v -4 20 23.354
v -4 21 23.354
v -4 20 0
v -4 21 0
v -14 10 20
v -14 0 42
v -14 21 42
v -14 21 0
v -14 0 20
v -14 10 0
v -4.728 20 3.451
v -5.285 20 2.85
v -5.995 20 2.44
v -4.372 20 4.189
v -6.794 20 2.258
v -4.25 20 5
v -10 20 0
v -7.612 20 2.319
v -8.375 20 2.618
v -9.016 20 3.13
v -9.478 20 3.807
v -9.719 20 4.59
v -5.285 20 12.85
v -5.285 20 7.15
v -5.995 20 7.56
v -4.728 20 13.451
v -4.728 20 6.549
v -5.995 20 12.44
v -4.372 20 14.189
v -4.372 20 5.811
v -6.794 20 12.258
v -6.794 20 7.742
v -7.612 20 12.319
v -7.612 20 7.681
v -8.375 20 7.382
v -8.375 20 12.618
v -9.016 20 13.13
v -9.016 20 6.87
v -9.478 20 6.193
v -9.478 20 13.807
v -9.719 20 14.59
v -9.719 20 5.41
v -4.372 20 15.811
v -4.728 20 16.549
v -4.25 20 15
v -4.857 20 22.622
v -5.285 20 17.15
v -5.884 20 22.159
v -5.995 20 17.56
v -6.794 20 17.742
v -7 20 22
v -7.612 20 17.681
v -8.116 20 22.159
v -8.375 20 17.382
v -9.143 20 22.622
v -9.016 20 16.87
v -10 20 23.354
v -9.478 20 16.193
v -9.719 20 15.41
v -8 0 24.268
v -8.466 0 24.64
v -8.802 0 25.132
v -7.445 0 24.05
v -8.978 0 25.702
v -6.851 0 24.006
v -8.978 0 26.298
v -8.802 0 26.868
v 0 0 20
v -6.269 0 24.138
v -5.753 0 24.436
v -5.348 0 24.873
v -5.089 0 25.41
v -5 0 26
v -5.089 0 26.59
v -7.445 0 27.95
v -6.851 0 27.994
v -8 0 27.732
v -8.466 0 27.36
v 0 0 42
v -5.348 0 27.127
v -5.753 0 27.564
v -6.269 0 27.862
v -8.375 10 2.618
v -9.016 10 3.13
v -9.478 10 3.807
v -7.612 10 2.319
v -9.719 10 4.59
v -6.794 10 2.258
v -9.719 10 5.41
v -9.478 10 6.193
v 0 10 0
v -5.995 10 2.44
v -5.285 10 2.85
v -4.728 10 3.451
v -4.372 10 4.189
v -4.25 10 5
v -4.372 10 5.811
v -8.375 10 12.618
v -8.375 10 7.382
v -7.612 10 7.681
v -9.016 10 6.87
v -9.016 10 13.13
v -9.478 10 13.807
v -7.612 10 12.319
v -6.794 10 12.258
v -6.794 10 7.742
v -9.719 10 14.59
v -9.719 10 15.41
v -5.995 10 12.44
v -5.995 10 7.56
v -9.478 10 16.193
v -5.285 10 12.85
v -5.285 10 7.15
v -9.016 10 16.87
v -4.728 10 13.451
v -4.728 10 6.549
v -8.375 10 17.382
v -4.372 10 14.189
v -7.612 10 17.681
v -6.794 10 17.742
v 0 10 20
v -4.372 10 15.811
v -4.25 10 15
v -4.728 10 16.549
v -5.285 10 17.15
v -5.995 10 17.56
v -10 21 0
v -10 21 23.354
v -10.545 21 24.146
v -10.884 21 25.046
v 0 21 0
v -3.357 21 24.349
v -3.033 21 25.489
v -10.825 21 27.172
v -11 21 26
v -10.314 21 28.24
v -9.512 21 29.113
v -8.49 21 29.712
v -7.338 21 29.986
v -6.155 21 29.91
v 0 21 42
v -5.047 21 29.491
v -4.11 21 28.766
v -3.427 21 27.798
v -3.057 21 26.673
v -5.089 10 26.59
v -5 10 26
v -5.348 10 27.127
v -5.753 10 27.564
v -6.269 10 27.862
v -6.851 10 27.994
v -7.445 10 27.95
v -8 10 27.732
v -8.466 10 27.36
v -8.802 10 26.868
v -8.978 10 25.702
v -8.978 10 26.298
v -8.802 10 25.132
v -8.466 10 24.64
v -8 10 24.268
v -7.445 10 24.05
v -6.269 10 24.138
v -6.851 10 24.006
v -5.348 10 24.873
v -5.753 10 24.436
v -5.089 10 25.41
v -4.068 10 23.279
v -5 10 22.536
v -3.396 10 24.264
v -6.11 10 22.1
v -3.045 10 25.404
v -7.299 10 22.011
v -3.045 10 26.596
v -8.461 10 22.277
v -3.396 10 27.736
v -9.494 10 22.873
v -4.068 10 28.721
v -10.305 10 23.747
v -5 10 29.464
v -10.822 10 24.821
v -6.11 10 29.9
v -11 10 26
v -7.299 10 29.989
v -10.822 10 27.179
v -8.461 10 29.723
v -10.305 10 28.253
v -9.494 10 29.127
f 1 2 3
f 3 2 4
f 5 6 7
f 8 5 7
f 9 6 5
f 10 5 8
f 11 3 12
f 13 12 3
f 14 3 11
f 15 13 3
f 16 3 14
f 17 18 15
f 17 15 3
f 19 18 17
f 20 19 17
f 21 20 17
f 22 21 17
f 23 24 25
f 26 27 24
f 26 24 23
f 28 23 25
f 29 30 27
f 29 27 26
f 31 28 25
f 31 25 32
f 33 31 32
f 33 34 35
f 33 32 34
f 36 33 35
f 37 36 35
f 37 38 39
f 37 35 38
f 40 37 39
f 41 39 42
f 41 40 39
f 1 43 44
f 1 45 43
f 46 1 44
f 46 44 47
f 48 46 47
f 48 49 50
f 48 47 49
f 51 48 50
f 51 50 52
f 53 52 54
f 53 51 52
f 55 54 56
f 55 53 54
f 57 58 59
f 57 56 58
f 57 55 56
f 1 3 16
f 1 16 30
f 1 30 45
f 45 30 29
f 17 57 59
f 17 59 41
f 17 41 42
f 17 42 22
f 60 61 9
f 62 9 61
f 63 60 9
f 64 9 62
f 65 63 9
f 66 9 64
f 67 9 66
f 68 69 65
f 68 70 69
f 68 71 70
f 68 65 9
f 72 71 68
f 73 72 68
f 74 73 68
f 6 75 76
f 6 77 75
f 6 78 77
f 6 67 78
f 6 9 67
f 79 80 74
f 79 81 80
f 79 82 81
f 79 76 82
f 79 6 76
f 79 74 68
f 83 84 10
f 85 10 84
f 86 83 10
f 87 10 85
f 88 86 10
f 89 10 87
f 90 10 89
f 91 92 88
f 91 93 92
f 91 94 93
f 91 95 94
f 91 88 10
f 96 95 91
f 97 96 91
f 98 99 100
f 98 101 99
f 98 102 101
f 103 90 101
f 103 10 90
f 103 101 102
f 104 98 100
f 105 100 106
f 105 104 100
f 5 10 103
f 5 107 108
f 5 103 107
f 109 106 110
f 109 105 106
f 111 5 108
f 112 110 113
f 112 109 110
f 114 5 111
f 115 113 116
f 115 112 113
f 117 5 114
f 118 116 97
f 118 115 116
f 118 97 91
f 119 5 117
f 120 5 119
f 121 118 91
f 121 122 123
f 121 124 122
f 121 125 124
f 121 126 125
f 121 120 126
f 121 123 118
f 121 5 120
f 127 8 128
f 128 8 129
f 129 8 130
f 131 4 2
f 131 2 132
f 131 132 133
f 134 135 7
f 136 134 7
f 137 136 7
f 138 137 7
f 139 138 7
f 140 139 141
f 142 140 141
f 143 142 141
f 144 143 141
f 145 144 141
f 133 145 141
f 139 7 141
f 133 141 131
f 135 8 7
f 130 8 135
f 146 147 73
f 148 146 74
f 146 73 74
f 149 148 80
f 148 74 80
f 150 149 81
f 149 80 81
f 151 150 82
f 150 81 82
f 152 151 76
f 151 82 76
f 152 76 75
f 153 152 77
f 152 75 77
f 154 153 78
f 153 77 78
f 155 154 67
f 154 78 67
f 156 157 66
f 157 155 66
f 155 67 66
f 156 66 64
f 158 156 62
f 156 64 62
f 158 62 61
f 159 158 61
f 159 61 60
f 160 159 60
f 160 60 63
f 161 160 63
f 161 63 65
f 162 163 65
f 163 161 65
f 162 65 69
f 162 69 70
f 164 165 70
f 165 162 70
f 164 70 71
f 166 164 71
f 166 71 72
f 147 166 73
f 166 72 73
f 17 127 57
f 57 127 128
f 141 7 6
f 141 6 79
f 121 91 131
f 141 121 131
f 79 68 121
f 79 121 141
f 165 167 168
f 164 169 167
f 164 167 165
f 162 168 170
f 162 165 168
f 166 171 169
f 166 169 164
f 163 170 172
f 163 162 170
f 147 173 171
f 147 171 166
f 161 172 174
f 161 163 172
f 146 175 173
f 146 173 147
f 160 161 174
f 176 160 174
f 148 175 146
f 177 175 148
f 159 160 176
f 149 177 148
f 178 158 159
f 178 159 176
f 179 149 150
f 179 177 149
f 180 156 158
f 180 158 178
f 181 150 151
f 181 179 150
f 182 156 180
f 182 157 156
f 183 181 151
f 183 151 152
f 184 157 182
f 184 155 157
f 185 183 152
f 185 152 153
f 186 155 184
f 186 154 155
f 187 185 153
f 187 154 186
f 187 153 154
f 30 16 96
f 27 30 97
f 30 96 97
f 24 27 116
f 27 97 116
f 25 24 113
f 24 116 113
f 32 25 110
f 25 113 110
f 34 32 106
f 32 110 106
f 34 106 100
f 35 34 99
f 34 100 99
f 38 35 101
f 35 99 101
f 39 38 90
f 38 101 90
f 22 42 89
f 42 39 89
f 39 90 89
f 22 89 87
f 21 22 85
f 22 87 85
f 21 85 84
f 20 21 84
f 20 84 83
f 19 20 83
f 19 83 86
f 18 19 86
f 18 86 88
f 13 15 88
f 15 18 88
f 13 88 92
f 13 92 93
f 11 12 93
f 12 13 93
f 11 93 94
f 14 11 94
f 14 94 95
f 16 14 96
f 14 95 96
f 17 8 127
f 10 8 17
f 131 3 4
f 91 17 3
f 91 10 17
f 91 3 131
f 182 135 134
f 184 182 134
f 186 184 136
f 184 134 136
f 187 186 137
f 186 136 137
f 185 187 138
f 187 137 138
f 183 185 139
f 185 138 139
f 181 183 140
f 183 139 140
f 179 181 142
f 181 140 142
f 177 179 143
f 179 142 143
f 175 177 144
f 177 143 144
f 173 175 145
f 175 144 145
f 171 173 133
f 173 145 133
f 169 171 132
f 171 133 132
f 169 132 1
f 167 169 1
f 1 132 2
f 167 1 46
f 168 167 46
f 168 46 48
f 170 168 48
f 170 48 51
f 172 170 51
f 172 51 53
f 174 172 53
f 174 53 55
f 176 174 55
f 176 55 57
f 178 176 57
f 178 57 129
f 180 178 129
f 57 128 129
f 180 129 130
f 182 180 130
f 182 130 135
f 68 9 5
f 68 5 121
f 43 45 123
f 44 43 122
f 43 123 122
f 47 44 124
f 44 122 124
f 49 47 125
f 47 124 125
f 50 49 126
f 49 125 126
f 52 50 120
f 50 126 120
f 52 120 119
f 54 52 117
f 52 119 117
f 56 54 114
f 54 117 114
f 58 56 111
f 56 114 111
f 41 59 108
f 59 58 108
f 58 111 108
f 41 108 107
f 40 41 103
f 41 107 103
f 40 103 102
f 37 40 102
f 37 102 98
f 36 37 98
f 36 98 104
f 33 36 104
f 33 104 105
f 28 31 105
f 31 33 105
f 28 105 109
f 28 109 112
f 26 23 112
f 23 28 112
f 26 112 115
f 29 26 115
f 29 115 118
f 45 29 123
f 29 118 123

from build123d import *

# Parameters (mm, degrees)
F0_W     = 14
F0_H     = 22
F0_R     = 2
F0_H_2   = 20
F0_R_2   = 2.75
F1_DEPTH = 21
F2_DEPTH = 10
F3_R     = 4
F3_R_2   = 2
F4_DEPTH = 11
F5_R     = 2.75
F6_DEPTH = 1


with BuildPart() as f1:
    # F0 (on Front) → F1 (new body)
    with BuildSketch(Plane.XZ):
        with Locations((-7, 31)):
            Rectangle(F0_W, F0_H)
        with Locations((-7, 26)):
            Circle(F0_R, mode=Mode.SUBTRACT)
        with Locations((-7, 10)):
            Rectangle(F0_W, F0_H_2)
        with Locations((-7, 5)):
            Circle(F0_R_2, mode=Mode.SUBTRACT)
        with Locations((-7, 15)):
            Circle(F0_R_2, mode=Mode.SUBTRACT)
    extrude(amount=-F1_DEPTH)

    # F0 (on Front) → F2 (cut)
    with BuildSketch(Plane.XZ):
        with Locations((-7, 10)):
            Rectangle(F0_W, F0_H_2)
        with Locations((-7, 5)):
            Circle(F0_R_2, mode=Mode.SUBTRACT)
        with Locations((-7, 15)):
            Circle(F0_R_2, mode=Mode.SUBTRACT)
    extrude(amount=-F2_DEPTH, mode=Mode.SUBTRACT)

    # F3 (on face) → F4 (cut)
    with BuildSketch(Plane(origin=(0, 21, 0), x_dir=(-1, 0, 0), z_dir=(0, 1, 0))):
        with Locations((7, 26)):
            Circle(F3_R)
        with Locations((7, 26)):
            Circle(F3_R_2, mode=Mode.SUBTRACT)
    extrude(amount=-F4_DEPTH, mode=Mode.SUBTRACT)

    # F5 (on face) → F6 (cut)
    with BuildSketch(Plane(origin=(0, 21, 0), x_dir=(-1, 0, 0), z_dir=(0, 1, 0))):
        with BuildLine():
            Line((4, 23.354249), (4, 0))
            Line((4, 0), (10, 0))
            Line((10, 0), (10, 23.354249))
            ThreePointArc((10, 23.354249), (7, 22), (4, 23.354249))
        make_face()
        with Locations((7, 5)):
            Circle(F5_R, mode=Mode.SUBTRACT)
        with Locations((7, 15)):
            Circle(F5_R, mode=Mode.SUBTRACT)
    extrude(amount=-F6_DEPTH, mode=Mode.SUBTRACT)


solid = f1.part
